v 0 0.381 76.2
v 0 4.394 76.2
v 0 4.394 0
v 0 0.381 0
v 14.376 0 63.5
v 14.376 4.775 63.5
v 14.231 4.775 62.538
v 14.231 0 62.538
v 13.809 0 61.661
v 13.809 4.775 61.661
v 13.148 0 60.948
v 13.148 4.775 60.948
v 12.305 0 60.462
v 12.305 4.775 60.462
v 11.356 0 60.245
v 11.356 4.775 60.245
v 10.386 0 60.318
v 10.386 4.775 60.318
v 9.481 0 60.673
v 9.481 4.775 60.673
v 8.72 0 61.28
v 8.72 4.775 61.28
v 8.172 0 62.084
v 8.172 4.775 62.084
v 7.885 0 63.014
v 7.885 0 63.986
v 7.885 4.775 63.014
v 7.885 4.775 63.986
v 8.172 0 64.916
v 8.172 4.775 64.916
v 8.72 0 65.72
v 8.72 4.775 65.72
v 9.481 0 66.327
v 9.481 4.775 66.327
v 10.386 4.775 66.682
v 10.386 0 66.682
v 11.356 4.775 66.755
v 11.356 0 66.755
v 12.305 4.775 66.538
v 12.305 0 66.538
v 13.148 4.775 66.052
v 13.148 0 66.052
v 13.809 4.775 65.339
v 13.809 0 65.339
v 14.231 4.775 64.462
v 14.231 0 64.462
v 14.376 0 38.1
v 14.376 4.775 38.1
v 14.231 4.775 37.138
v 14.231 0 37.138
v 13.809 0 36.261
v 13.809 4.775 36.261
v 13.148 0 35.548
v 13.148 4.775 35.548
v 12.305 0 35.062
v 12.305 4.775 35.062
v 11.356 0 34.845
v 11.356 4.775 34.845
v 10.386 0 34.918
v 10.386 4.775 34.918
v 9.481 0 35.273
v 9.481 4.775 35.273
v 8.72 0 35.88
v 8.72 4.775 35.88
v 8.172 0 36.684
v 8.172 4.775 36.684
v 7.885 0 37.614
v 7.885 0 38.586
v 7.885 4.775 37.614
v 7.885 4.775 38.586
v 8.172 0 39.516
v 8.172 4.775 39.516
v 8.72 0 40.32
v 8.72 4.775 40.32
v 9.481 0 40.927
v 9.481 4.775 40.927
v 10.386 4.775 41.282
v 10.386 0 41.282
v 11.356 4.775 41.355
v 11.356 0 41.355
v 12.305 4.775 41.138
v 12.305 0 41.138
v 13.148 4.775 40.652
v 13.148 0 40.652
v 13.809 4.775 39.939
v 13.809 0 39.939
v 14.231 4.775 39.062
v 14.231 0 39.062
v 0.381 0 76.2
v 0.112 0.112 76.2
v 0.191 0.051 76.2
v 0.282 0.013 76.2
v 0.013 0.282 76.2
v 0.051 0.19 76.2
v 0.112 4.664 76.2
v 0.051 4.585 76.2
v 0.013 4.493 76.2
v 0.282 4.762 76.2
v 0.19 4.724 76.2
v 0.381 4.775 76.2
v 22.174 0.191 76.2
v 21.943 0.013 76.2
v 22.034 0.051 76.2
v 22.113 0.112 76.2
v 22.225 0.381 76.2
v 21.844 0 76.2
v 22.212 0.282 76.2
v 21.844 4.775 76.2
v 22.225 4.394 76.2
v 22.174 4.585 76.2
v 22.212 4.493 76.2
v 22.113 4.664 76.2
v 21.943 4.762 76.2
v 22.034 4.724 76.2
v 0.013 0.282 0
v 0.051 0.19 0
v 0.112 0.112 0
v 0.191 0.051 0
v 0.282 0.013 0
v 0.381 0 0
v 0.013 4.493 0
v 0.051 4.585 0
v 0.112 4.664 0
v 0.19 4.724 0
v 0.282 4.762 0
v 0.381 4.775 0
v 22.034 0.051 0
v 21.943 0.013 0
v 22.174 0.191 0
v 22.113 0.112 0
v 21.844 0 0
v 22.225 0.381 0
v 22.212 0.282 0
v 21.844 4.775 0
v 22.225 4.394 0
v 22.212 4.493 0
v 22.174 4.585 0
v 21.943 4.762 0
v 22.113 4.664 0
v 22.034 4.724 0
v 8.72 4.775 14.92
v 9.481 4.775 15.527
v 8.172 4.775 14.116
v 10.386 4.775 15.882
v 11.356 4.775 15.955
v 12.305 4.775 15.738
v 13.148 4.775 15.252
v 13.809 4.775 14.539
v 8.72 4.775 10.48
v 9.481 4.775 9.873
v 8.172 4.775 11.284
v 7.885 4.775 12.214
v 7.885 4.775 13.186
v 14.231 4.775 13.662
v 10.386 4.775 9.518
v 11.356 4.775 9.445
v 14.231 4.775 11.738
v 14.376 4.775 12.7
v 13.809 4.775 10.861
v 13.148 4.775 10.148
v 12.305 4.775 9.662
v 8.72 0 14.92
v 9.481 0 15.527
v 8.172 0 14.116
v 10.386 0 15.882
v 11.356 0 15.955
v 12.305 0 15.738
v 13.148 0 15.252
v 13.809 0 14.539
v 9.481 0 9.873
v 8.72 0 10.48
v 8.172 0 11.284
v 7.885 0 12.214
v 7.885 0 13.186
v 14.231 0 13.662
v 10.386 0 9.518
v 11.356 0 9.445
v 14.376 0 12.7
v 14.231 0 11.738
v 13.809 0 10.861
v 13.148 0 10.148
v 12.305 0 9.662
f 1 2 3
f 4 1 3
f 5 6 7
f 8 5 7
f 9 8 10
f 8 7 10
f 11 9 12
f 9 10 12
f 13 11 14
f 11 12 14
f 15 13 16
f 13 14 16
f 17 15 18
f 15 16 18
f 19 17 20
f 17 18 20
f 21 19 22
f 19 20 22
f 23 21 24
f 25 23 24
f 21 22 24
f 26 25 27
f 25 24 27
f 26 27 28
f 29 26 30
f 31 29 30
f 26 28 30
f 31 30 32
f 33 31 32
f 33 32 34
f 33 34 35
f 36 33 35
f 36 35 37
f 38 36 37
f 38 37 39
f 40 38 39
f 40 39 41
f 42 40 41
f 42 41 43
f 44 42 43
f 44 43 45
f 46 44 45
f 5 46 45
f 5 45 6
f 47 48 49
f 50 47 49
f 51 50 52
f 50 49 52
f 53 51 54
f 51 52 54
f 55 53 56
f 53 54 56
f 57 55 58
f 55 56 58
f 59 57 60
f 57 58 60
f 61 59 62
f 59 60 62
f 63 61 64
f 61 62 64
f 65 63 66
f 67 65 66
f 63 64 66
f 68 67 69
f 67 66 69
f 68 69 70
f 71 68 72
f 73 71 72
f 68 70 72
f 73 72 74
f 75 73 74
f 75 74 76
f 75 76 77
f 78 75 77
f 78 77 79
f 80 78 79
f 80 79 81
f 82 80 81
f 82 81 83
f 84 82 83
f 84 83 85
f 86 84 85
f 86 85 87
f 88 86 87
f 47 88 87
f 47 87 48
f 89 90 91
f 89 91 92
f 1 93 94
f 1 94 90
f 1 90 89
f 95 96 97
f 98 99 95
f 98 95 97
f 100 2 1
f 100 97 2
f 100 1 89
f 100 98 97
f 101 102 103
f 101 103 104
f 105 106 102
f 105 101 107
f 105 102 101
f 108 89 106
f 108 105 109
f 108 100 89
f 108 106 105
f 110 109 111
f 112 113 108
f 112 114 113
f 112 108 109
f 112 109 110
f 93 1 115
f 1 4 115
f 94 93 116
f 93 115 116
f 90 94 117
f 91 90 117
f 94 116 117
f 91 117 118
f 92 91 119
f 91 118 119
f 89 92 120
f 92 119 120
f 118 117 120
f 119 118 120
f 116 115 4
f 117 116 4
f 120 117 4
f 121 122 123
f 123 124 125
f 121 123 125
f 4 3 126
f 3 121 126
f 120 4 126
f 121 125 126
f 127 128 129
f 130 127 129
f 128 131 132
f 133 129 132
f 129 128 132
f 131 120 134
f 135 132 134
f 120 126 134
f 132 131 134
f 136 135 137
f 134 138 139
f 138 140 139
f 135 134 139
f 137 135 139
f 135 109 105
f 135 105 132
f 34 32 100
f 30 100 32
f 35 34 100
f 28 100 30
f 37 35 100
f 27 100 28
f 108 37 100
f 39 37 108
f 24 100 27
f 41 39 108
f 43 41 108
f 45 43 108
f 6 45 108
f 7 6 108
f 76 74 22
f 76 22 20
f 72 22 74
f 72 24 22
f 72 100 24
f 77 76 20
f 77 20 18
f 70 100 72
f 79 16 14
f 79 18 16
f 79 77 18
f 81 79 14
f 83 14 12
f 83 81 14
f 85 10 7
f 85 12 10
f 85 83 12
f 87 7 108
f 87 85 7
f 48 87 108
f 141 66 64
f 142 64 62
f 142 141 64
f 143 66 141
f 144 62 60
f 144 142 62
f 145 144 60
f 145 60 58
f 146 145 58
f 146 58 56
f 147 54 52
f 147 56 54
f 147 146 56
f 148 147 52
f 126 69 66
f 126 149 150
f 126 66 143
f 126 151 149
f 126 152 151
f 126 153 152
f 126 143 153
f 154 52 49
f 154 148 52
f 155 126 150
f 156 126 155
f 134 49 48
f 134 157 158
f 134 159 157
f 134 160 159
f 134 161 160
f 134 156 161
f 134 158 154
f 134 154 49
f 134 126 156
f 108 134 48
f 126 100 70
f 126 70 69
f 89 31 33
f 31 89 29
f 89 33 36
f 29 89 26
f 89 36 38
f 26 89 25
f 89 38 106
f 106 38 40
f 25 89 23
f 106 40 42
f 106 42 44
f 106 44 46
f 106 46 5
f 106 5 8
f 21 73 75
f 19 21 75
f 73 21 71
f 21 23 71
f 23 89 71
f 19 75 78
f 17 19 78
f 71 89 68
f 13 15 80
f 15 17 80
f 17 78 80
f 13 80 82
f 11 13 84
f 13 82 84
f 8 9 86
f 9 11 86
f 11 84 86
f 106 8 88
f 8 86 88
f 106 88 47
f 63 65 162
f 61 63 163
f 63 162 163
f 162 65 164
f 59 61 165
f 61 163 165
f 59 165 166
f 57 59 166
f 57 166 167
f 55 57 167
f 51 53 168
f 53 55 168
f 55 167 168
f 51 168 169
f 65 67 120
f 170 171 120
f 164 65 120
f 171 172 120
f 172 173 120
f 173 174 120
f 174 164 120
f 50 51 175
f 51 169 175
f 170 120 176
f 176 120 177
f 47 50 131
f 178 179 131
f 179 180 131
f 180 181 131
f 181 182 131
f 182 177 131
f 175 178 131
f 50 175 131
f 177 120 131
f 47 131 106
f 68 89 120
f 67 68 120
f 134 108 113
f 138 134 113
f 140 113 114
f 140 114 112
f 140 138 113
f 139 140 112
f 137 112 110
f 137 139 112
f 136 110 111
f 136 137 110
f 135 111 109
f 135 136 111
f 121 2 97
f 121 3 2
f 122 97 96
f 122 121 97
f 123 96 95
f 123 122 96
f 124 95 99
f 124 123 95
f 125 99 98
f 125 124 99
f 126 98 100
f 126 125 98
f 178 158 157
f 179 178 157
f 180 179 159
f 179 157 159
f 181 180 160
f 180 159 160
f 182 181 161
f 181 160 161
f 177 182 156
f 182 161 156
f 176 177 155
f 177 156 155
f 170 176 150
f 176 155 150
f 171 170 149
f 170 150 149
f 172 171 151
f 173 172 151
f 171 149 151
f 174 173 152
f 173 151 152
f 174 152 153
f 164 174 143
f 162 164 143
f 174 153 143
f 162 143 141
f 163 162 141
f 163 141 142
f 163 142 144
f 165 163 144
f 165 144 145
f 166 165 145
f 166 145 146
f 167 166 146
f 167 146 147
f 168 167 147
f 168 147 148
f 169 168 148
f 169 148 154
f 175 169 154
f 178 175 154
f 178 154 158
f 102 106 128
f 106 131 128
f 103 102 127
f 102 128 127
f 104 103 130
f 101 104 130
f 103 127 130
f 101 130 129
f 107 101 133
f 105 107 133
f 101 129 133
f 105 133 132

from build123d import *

# Parameters (mm, degrees)
SKETCH1_W                = 22.225
SKETCH1_H                = 76.2
BOSS_EXTRUDE1_DEPTH      = 4.7752
F_0_257_DIAMETER_HOLE1_D = 6.5278
FILLET1_R                = 0.381


with BuildPart() as part:
    # Sketch1 → Boss-Extrude1 (new body)
    with BuildSketch(Plane(origin=(0, 4.7752, 0), x_dir=(1, 0, 0), z_dir=(0, 1, 0))):
        with Locations((11.1125, -38.1)):
            Rectangle(SKETCH1_W, SKETCH1_H)
    extrude(amount=-BOSS_EXTRUDE1_DEPTH)

    # F (0.257) Diameter Hole1 (through all)
    with Locations(Plane(origin=(0, 0, 0), x_dir=(-1, 0, 0), z_dir=(0, -1, 0))):
        with Locations((-11.1125, -12.7), (-11.1125, -38.1), (-11.1125, -63.5)):
            Hole(F_0_257_DIAMETER_HOLE1_D / 2)

    # Fillet1
    fillet1_edges = [part.edges().sort_by_distance(p)[0] for p in [
        (0, 0, 38.1),
        (22.225, 0, 38.1),
        (0, 4.7752, 38.1),
        (22.225, 4.7752, 38.1),
    ]]
    fillet(fillet1_edges, radius=FILLET1_R)


solid = part.part
